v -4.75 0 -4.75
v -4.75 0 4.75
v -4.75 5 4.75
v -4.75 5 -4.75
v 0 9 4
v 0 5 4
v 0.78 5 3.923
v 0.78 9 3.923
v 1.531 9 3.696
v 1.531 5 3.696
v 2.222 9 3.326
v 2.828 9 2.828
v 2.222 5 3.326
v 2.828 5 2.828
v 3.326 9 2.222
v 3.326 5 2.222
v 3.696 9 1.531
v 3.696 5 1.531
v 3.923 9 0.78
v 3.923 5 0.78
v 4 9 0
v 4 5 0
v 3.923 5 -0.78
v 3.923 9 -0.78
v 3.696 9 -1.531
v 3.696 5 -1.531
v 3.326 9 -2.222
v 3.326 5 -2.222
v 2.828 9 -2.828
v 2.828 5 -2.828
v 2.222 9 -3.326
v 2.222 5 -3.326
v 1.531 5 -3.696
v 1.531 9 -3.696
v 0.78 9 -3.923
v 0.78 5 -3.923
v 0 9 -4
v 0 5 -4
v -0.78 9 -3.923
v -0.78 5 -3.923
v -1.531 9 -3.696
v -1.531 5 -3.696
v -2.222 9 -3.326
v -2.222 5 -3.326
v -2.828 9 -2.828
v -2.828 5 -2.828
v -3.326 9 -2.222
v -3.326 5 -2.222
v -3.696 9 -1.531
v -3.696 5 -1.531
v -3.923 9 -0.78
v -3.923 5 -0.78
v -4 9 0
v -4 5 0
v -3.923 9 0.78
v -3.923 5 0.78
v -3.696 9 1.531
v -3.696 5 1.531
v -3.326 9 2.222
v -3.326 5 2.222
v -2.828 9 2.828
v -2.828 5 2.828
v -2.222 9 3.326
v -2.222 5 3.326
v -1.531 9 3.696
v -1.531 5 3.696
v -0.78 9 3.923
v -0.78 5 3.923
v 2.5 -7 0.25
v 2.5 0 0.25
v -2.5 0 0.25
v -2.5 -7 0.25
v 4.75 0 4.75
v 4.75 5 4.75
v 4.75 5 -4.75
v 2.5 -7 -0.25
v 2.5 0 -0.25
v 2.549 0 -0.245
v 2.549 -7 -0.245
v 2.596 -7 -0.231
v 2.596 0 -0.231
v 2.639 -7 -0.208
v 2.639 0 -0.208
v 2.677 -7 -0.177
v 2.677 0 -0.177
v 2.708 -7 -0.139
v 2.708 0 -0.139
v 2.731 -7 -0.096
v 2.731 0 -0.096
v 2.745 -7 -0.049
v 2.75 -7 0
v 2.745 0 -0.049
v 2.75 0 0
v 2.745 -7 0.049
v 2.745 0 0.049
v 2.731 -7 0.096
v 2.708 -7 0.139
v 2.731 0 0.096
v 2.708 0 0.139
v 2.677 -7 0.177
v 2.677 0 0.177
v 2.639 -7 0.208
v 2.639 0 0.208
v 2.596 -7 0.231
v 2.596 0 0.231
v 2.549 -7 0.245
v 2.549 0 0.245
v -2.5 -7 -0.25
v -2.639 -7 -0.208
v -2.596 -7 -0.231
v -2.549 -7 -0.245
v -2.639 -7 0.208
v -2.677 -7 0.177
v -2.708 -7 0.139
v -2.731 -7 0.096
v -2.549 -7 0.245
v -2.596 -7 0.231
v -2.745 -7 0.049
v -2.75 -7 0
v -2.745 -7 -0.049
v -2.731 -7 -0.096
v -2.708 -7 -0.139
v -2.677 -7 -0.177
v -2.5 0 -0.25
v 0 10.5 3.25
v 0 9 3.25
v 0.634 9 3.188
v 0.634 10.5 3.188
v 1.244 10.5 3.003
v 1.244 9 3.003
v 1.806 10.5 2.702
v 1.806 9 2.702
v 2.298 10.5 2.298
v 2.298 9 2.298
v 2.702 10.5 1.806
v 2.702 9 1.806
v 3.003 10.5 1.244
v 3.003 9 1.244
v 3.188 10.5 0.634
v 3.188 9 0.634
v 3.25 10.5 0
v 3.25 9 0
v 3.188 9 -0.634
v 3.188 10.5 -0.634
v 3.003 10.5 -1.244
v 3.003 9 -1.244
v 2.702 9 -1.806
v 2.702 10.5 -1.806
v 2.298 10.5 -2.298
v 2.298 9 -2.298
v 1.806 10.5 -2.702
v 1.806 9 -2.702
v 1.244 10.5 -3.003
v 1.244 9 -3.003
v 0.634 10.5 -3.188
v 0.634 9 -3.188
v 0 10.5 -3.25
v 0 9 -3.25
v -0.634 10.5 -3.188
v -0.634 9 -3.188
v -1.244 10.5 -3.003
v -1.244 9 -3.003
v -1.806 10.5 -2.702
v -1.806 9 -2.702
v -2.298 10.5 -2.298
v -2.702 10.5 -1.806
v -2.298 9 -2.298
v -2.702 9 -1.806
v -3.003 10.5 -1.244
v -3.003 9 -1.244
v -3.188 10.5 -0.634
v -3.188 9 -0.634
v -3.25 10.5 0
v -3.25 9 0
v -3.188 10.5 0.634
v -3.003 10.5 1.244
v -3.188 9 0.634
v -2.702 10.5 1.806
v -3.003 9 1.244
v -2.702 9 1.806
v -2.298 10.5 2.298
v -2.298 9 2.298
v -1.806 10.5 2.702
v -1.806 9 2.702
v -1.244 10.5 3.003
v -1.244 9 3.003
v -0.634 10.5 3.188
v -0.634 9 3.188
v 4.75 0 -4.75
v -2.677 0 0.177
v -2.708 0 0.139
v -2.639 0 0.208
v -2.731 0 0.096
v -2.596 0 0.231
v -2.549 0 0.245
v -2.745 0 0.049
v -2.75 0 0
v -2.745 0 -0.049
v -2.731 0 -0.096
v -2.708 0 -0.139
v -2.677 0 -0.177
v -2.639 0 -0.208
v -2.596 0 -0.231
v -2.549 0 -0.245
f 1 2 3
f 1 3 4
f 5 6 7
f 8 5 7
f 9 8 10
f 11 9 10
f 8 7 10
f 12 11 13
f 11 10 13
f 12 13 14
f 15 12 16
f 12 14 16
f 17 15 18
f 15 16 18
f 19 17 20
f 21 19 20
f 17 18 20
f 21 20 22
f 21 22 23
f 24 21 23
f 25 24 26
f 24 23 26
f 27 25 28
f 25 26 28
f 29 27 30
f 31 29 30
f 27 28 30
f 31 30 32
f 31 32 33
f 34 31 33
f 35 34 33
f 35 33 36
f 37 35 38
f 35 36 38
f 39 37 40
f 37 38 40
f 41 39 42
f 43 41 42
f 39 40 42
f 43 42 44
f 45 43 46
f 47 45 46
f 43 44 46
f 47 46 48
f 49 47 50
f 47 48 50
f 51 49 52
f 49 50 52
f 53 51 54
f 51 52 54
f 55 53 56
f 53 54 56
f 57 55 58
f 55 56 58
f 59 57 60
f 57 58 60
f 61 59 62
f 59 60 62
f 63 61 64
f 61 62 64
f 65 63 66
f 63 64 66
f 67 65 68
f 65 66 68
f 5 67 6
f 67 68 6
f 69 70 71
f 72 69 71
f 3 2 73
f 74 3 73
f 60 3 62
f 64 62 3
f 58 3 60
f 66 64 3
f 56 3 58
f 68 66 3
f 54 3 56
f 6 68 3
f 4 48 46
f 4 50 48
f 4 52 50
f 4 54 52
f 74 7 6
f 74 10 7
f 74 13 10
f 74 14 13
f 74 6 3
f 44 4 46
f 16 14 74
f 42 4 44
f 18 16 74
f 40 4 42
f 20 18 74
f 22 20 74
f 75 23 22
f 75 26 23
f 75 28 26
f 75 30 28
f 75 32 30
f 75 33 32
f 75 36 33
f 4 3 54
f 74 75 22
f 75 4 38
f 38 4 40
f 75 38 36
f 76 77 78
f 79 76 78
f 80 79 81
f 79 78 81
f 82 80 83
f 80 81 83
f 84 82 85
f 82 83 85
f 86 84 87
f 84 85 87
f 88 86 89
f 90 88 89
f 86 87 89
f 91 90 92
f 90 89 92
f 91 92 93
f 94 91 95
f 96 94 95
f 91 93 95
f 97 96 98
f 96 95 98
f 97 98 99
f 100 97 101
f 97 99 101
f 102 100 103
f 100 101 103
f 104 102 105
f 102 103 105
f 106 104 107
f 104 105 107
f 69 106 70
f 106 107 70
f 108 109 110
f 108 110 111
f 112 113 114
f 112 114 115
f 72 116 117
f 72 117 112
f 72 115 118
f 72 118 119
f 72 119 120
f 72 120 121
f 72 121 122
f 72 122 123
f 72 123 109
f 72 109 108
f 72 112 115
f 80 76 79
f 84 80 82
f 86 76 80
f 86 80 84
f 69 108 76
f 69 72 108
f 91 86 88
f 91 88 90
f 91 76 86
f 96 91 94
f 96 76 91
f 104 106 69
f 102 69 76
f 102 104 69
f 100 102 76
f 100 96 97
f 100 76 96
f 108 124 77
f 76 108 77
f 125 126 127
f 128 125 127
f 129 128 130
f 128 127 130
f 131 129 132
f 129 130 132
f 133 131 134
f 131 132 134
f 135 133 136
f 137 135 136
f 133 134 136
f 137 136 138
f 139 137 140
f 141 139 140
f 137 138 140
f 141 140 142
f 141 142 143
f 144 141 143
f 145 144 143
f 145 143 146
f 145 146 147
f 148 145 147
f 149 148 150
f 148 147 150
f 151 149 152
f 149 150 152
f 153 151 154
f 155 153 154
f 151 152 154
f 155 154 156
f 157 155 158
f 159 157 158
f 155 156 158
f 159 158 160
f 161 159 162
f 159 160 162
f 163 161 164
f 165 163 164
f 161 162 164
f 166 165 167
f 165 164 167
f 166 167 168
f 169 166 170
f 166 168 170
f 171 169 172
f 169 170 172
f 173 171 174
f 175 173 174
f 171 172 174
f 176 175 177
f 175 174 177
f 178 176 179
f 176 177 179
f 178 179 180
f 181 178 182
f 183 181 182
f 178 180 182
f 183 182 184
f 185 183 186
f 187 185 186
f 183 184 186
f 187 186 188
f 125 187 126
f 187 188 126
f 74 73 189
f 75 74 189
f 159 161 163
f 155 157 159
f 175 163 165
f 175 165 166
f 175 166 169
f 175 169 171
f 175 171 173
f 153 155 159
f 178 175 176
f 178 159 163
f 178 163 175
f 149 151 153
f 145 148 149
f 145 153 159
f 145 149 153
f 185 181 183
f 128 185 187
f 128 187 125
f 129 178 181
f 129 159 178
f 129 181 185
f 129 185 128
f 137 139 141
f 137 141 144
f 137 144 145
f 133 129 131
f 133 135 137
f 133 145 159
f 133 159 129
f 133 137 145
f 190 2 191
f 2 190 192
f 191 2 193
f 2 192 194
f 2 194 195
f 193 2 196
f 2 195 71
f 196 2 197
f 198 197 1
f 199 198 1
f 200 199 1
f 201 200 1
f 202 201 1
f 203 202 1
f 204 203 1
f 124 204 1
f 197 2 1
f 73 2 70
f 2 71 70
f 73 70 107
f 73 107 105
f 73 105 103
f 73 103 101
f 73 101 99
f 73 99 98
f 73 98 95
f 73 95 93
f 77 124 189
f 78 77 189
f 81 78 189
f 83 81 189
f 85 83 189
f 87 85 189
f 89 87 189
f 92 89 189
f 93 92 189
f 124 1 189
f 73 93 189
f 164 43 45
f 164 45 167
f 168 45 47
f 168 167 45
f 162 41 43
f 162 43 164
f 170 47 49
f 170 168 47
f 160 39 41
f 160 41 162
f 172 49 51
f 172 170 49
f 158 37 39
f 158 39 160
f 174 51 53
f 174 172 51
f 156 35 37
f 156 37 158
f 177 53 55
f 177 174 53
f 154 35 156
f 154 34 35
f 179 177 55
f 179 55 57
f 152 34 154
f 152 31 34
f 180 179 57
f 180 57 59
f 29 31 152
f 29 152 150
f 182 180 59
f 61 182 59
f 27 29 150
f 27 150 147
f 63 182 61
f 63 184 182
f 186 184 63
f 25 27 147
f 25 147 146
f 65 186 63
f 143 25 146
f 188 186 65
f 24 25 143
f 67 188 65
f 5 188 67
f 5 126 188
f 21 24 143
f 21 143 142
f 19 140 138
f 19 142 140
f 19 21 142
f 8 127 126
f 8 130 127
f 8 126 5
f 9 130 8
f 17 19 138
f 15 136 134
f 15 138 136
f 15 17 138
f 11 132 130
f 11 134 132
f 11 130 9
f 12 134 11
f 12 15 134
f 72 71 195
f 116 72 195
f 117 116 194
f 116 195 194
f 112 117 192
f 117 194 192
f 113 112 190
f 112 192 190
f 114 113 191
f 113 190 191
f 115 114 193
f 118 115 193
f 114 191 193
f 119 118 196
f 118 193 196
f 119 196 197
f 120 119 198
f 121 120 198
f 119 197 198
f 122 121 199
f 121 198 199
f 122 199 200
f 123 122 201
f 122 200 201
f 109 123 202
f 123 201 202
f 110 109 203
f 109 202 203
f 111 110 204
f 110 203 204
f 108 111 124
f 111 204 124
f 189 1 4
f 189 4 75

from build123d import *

# Parameters (mm, degrees)
SKETCH2_W           = 9.5
SKETCH2_H           = 9.5
BOSS_EXTRUDE1_DEPTH = 5
SKETCH3_R           = 4
BOSS_EXTRUDE2_DEPTH = 4
SKETCH4_R           = 3.25
BOSS_EXTRUDE3_DEPTH = 1.5
BOSS_EXTRUDE4_DEPTH = 7


with BuildPart() as part:
    # Sketch2 → Boss-Extrude1 (new body)
    with BuildSketch(Plane(origin=(0, 0, 0), x_dir=(1, 0, 0), z_dir=(0, 1, 0))):
        Rectangle(SKETCH2_W, SKETCH2_H)
    extrude(amount=BOSS_EXTRUDE1_DEPTH)

    # Sketch3 → Boss-Extrude2 (add)
    with BuildSketch(Plane(origin=(0, 5, 0), x_dir=(1, 0, 0), z_dir=(0, 1, 0))):
        with Locations(Location((0, 0, 0), (0, 0, 270))):
            Circle(SKETCH3_R)
    extrude(amount=BOSS_EXTRUDE2_DEPTH)

    # Sketch4 → Boss-Extrude3 (add)
    with BuildSketch(Plane(origin=(0, 9, 0), x_dir=(1, 0, 0), z_dir=(0, 1, 0))):
        with Locations(Location((0, 0, 0), (0, 0, 270))):
            Circle(SKETCH4_R)
    extrude(amount=BOSS_EXTRUDE3_DEPTH)

    # Sketch5 → Boss-Extrude4 (add)
    with BuildSketch(Plane.XZ):
        with BuildLine():
            Line((-2.5, -0.25), (2.5, -0.25))
            ThreePointArc((2.5, -0.25), (2.75, 0), (2.5, 0.25))
            Line((2.5, 0.25), (-2.5, 0.25))
            ThreePointArc((-2.5, 0.25), (-2.75, 0), (-2.5, -0.25))
        make_face()
    extrude(amount=BOSS_EXTRUDE4_DEPTH)


solid = part.part
